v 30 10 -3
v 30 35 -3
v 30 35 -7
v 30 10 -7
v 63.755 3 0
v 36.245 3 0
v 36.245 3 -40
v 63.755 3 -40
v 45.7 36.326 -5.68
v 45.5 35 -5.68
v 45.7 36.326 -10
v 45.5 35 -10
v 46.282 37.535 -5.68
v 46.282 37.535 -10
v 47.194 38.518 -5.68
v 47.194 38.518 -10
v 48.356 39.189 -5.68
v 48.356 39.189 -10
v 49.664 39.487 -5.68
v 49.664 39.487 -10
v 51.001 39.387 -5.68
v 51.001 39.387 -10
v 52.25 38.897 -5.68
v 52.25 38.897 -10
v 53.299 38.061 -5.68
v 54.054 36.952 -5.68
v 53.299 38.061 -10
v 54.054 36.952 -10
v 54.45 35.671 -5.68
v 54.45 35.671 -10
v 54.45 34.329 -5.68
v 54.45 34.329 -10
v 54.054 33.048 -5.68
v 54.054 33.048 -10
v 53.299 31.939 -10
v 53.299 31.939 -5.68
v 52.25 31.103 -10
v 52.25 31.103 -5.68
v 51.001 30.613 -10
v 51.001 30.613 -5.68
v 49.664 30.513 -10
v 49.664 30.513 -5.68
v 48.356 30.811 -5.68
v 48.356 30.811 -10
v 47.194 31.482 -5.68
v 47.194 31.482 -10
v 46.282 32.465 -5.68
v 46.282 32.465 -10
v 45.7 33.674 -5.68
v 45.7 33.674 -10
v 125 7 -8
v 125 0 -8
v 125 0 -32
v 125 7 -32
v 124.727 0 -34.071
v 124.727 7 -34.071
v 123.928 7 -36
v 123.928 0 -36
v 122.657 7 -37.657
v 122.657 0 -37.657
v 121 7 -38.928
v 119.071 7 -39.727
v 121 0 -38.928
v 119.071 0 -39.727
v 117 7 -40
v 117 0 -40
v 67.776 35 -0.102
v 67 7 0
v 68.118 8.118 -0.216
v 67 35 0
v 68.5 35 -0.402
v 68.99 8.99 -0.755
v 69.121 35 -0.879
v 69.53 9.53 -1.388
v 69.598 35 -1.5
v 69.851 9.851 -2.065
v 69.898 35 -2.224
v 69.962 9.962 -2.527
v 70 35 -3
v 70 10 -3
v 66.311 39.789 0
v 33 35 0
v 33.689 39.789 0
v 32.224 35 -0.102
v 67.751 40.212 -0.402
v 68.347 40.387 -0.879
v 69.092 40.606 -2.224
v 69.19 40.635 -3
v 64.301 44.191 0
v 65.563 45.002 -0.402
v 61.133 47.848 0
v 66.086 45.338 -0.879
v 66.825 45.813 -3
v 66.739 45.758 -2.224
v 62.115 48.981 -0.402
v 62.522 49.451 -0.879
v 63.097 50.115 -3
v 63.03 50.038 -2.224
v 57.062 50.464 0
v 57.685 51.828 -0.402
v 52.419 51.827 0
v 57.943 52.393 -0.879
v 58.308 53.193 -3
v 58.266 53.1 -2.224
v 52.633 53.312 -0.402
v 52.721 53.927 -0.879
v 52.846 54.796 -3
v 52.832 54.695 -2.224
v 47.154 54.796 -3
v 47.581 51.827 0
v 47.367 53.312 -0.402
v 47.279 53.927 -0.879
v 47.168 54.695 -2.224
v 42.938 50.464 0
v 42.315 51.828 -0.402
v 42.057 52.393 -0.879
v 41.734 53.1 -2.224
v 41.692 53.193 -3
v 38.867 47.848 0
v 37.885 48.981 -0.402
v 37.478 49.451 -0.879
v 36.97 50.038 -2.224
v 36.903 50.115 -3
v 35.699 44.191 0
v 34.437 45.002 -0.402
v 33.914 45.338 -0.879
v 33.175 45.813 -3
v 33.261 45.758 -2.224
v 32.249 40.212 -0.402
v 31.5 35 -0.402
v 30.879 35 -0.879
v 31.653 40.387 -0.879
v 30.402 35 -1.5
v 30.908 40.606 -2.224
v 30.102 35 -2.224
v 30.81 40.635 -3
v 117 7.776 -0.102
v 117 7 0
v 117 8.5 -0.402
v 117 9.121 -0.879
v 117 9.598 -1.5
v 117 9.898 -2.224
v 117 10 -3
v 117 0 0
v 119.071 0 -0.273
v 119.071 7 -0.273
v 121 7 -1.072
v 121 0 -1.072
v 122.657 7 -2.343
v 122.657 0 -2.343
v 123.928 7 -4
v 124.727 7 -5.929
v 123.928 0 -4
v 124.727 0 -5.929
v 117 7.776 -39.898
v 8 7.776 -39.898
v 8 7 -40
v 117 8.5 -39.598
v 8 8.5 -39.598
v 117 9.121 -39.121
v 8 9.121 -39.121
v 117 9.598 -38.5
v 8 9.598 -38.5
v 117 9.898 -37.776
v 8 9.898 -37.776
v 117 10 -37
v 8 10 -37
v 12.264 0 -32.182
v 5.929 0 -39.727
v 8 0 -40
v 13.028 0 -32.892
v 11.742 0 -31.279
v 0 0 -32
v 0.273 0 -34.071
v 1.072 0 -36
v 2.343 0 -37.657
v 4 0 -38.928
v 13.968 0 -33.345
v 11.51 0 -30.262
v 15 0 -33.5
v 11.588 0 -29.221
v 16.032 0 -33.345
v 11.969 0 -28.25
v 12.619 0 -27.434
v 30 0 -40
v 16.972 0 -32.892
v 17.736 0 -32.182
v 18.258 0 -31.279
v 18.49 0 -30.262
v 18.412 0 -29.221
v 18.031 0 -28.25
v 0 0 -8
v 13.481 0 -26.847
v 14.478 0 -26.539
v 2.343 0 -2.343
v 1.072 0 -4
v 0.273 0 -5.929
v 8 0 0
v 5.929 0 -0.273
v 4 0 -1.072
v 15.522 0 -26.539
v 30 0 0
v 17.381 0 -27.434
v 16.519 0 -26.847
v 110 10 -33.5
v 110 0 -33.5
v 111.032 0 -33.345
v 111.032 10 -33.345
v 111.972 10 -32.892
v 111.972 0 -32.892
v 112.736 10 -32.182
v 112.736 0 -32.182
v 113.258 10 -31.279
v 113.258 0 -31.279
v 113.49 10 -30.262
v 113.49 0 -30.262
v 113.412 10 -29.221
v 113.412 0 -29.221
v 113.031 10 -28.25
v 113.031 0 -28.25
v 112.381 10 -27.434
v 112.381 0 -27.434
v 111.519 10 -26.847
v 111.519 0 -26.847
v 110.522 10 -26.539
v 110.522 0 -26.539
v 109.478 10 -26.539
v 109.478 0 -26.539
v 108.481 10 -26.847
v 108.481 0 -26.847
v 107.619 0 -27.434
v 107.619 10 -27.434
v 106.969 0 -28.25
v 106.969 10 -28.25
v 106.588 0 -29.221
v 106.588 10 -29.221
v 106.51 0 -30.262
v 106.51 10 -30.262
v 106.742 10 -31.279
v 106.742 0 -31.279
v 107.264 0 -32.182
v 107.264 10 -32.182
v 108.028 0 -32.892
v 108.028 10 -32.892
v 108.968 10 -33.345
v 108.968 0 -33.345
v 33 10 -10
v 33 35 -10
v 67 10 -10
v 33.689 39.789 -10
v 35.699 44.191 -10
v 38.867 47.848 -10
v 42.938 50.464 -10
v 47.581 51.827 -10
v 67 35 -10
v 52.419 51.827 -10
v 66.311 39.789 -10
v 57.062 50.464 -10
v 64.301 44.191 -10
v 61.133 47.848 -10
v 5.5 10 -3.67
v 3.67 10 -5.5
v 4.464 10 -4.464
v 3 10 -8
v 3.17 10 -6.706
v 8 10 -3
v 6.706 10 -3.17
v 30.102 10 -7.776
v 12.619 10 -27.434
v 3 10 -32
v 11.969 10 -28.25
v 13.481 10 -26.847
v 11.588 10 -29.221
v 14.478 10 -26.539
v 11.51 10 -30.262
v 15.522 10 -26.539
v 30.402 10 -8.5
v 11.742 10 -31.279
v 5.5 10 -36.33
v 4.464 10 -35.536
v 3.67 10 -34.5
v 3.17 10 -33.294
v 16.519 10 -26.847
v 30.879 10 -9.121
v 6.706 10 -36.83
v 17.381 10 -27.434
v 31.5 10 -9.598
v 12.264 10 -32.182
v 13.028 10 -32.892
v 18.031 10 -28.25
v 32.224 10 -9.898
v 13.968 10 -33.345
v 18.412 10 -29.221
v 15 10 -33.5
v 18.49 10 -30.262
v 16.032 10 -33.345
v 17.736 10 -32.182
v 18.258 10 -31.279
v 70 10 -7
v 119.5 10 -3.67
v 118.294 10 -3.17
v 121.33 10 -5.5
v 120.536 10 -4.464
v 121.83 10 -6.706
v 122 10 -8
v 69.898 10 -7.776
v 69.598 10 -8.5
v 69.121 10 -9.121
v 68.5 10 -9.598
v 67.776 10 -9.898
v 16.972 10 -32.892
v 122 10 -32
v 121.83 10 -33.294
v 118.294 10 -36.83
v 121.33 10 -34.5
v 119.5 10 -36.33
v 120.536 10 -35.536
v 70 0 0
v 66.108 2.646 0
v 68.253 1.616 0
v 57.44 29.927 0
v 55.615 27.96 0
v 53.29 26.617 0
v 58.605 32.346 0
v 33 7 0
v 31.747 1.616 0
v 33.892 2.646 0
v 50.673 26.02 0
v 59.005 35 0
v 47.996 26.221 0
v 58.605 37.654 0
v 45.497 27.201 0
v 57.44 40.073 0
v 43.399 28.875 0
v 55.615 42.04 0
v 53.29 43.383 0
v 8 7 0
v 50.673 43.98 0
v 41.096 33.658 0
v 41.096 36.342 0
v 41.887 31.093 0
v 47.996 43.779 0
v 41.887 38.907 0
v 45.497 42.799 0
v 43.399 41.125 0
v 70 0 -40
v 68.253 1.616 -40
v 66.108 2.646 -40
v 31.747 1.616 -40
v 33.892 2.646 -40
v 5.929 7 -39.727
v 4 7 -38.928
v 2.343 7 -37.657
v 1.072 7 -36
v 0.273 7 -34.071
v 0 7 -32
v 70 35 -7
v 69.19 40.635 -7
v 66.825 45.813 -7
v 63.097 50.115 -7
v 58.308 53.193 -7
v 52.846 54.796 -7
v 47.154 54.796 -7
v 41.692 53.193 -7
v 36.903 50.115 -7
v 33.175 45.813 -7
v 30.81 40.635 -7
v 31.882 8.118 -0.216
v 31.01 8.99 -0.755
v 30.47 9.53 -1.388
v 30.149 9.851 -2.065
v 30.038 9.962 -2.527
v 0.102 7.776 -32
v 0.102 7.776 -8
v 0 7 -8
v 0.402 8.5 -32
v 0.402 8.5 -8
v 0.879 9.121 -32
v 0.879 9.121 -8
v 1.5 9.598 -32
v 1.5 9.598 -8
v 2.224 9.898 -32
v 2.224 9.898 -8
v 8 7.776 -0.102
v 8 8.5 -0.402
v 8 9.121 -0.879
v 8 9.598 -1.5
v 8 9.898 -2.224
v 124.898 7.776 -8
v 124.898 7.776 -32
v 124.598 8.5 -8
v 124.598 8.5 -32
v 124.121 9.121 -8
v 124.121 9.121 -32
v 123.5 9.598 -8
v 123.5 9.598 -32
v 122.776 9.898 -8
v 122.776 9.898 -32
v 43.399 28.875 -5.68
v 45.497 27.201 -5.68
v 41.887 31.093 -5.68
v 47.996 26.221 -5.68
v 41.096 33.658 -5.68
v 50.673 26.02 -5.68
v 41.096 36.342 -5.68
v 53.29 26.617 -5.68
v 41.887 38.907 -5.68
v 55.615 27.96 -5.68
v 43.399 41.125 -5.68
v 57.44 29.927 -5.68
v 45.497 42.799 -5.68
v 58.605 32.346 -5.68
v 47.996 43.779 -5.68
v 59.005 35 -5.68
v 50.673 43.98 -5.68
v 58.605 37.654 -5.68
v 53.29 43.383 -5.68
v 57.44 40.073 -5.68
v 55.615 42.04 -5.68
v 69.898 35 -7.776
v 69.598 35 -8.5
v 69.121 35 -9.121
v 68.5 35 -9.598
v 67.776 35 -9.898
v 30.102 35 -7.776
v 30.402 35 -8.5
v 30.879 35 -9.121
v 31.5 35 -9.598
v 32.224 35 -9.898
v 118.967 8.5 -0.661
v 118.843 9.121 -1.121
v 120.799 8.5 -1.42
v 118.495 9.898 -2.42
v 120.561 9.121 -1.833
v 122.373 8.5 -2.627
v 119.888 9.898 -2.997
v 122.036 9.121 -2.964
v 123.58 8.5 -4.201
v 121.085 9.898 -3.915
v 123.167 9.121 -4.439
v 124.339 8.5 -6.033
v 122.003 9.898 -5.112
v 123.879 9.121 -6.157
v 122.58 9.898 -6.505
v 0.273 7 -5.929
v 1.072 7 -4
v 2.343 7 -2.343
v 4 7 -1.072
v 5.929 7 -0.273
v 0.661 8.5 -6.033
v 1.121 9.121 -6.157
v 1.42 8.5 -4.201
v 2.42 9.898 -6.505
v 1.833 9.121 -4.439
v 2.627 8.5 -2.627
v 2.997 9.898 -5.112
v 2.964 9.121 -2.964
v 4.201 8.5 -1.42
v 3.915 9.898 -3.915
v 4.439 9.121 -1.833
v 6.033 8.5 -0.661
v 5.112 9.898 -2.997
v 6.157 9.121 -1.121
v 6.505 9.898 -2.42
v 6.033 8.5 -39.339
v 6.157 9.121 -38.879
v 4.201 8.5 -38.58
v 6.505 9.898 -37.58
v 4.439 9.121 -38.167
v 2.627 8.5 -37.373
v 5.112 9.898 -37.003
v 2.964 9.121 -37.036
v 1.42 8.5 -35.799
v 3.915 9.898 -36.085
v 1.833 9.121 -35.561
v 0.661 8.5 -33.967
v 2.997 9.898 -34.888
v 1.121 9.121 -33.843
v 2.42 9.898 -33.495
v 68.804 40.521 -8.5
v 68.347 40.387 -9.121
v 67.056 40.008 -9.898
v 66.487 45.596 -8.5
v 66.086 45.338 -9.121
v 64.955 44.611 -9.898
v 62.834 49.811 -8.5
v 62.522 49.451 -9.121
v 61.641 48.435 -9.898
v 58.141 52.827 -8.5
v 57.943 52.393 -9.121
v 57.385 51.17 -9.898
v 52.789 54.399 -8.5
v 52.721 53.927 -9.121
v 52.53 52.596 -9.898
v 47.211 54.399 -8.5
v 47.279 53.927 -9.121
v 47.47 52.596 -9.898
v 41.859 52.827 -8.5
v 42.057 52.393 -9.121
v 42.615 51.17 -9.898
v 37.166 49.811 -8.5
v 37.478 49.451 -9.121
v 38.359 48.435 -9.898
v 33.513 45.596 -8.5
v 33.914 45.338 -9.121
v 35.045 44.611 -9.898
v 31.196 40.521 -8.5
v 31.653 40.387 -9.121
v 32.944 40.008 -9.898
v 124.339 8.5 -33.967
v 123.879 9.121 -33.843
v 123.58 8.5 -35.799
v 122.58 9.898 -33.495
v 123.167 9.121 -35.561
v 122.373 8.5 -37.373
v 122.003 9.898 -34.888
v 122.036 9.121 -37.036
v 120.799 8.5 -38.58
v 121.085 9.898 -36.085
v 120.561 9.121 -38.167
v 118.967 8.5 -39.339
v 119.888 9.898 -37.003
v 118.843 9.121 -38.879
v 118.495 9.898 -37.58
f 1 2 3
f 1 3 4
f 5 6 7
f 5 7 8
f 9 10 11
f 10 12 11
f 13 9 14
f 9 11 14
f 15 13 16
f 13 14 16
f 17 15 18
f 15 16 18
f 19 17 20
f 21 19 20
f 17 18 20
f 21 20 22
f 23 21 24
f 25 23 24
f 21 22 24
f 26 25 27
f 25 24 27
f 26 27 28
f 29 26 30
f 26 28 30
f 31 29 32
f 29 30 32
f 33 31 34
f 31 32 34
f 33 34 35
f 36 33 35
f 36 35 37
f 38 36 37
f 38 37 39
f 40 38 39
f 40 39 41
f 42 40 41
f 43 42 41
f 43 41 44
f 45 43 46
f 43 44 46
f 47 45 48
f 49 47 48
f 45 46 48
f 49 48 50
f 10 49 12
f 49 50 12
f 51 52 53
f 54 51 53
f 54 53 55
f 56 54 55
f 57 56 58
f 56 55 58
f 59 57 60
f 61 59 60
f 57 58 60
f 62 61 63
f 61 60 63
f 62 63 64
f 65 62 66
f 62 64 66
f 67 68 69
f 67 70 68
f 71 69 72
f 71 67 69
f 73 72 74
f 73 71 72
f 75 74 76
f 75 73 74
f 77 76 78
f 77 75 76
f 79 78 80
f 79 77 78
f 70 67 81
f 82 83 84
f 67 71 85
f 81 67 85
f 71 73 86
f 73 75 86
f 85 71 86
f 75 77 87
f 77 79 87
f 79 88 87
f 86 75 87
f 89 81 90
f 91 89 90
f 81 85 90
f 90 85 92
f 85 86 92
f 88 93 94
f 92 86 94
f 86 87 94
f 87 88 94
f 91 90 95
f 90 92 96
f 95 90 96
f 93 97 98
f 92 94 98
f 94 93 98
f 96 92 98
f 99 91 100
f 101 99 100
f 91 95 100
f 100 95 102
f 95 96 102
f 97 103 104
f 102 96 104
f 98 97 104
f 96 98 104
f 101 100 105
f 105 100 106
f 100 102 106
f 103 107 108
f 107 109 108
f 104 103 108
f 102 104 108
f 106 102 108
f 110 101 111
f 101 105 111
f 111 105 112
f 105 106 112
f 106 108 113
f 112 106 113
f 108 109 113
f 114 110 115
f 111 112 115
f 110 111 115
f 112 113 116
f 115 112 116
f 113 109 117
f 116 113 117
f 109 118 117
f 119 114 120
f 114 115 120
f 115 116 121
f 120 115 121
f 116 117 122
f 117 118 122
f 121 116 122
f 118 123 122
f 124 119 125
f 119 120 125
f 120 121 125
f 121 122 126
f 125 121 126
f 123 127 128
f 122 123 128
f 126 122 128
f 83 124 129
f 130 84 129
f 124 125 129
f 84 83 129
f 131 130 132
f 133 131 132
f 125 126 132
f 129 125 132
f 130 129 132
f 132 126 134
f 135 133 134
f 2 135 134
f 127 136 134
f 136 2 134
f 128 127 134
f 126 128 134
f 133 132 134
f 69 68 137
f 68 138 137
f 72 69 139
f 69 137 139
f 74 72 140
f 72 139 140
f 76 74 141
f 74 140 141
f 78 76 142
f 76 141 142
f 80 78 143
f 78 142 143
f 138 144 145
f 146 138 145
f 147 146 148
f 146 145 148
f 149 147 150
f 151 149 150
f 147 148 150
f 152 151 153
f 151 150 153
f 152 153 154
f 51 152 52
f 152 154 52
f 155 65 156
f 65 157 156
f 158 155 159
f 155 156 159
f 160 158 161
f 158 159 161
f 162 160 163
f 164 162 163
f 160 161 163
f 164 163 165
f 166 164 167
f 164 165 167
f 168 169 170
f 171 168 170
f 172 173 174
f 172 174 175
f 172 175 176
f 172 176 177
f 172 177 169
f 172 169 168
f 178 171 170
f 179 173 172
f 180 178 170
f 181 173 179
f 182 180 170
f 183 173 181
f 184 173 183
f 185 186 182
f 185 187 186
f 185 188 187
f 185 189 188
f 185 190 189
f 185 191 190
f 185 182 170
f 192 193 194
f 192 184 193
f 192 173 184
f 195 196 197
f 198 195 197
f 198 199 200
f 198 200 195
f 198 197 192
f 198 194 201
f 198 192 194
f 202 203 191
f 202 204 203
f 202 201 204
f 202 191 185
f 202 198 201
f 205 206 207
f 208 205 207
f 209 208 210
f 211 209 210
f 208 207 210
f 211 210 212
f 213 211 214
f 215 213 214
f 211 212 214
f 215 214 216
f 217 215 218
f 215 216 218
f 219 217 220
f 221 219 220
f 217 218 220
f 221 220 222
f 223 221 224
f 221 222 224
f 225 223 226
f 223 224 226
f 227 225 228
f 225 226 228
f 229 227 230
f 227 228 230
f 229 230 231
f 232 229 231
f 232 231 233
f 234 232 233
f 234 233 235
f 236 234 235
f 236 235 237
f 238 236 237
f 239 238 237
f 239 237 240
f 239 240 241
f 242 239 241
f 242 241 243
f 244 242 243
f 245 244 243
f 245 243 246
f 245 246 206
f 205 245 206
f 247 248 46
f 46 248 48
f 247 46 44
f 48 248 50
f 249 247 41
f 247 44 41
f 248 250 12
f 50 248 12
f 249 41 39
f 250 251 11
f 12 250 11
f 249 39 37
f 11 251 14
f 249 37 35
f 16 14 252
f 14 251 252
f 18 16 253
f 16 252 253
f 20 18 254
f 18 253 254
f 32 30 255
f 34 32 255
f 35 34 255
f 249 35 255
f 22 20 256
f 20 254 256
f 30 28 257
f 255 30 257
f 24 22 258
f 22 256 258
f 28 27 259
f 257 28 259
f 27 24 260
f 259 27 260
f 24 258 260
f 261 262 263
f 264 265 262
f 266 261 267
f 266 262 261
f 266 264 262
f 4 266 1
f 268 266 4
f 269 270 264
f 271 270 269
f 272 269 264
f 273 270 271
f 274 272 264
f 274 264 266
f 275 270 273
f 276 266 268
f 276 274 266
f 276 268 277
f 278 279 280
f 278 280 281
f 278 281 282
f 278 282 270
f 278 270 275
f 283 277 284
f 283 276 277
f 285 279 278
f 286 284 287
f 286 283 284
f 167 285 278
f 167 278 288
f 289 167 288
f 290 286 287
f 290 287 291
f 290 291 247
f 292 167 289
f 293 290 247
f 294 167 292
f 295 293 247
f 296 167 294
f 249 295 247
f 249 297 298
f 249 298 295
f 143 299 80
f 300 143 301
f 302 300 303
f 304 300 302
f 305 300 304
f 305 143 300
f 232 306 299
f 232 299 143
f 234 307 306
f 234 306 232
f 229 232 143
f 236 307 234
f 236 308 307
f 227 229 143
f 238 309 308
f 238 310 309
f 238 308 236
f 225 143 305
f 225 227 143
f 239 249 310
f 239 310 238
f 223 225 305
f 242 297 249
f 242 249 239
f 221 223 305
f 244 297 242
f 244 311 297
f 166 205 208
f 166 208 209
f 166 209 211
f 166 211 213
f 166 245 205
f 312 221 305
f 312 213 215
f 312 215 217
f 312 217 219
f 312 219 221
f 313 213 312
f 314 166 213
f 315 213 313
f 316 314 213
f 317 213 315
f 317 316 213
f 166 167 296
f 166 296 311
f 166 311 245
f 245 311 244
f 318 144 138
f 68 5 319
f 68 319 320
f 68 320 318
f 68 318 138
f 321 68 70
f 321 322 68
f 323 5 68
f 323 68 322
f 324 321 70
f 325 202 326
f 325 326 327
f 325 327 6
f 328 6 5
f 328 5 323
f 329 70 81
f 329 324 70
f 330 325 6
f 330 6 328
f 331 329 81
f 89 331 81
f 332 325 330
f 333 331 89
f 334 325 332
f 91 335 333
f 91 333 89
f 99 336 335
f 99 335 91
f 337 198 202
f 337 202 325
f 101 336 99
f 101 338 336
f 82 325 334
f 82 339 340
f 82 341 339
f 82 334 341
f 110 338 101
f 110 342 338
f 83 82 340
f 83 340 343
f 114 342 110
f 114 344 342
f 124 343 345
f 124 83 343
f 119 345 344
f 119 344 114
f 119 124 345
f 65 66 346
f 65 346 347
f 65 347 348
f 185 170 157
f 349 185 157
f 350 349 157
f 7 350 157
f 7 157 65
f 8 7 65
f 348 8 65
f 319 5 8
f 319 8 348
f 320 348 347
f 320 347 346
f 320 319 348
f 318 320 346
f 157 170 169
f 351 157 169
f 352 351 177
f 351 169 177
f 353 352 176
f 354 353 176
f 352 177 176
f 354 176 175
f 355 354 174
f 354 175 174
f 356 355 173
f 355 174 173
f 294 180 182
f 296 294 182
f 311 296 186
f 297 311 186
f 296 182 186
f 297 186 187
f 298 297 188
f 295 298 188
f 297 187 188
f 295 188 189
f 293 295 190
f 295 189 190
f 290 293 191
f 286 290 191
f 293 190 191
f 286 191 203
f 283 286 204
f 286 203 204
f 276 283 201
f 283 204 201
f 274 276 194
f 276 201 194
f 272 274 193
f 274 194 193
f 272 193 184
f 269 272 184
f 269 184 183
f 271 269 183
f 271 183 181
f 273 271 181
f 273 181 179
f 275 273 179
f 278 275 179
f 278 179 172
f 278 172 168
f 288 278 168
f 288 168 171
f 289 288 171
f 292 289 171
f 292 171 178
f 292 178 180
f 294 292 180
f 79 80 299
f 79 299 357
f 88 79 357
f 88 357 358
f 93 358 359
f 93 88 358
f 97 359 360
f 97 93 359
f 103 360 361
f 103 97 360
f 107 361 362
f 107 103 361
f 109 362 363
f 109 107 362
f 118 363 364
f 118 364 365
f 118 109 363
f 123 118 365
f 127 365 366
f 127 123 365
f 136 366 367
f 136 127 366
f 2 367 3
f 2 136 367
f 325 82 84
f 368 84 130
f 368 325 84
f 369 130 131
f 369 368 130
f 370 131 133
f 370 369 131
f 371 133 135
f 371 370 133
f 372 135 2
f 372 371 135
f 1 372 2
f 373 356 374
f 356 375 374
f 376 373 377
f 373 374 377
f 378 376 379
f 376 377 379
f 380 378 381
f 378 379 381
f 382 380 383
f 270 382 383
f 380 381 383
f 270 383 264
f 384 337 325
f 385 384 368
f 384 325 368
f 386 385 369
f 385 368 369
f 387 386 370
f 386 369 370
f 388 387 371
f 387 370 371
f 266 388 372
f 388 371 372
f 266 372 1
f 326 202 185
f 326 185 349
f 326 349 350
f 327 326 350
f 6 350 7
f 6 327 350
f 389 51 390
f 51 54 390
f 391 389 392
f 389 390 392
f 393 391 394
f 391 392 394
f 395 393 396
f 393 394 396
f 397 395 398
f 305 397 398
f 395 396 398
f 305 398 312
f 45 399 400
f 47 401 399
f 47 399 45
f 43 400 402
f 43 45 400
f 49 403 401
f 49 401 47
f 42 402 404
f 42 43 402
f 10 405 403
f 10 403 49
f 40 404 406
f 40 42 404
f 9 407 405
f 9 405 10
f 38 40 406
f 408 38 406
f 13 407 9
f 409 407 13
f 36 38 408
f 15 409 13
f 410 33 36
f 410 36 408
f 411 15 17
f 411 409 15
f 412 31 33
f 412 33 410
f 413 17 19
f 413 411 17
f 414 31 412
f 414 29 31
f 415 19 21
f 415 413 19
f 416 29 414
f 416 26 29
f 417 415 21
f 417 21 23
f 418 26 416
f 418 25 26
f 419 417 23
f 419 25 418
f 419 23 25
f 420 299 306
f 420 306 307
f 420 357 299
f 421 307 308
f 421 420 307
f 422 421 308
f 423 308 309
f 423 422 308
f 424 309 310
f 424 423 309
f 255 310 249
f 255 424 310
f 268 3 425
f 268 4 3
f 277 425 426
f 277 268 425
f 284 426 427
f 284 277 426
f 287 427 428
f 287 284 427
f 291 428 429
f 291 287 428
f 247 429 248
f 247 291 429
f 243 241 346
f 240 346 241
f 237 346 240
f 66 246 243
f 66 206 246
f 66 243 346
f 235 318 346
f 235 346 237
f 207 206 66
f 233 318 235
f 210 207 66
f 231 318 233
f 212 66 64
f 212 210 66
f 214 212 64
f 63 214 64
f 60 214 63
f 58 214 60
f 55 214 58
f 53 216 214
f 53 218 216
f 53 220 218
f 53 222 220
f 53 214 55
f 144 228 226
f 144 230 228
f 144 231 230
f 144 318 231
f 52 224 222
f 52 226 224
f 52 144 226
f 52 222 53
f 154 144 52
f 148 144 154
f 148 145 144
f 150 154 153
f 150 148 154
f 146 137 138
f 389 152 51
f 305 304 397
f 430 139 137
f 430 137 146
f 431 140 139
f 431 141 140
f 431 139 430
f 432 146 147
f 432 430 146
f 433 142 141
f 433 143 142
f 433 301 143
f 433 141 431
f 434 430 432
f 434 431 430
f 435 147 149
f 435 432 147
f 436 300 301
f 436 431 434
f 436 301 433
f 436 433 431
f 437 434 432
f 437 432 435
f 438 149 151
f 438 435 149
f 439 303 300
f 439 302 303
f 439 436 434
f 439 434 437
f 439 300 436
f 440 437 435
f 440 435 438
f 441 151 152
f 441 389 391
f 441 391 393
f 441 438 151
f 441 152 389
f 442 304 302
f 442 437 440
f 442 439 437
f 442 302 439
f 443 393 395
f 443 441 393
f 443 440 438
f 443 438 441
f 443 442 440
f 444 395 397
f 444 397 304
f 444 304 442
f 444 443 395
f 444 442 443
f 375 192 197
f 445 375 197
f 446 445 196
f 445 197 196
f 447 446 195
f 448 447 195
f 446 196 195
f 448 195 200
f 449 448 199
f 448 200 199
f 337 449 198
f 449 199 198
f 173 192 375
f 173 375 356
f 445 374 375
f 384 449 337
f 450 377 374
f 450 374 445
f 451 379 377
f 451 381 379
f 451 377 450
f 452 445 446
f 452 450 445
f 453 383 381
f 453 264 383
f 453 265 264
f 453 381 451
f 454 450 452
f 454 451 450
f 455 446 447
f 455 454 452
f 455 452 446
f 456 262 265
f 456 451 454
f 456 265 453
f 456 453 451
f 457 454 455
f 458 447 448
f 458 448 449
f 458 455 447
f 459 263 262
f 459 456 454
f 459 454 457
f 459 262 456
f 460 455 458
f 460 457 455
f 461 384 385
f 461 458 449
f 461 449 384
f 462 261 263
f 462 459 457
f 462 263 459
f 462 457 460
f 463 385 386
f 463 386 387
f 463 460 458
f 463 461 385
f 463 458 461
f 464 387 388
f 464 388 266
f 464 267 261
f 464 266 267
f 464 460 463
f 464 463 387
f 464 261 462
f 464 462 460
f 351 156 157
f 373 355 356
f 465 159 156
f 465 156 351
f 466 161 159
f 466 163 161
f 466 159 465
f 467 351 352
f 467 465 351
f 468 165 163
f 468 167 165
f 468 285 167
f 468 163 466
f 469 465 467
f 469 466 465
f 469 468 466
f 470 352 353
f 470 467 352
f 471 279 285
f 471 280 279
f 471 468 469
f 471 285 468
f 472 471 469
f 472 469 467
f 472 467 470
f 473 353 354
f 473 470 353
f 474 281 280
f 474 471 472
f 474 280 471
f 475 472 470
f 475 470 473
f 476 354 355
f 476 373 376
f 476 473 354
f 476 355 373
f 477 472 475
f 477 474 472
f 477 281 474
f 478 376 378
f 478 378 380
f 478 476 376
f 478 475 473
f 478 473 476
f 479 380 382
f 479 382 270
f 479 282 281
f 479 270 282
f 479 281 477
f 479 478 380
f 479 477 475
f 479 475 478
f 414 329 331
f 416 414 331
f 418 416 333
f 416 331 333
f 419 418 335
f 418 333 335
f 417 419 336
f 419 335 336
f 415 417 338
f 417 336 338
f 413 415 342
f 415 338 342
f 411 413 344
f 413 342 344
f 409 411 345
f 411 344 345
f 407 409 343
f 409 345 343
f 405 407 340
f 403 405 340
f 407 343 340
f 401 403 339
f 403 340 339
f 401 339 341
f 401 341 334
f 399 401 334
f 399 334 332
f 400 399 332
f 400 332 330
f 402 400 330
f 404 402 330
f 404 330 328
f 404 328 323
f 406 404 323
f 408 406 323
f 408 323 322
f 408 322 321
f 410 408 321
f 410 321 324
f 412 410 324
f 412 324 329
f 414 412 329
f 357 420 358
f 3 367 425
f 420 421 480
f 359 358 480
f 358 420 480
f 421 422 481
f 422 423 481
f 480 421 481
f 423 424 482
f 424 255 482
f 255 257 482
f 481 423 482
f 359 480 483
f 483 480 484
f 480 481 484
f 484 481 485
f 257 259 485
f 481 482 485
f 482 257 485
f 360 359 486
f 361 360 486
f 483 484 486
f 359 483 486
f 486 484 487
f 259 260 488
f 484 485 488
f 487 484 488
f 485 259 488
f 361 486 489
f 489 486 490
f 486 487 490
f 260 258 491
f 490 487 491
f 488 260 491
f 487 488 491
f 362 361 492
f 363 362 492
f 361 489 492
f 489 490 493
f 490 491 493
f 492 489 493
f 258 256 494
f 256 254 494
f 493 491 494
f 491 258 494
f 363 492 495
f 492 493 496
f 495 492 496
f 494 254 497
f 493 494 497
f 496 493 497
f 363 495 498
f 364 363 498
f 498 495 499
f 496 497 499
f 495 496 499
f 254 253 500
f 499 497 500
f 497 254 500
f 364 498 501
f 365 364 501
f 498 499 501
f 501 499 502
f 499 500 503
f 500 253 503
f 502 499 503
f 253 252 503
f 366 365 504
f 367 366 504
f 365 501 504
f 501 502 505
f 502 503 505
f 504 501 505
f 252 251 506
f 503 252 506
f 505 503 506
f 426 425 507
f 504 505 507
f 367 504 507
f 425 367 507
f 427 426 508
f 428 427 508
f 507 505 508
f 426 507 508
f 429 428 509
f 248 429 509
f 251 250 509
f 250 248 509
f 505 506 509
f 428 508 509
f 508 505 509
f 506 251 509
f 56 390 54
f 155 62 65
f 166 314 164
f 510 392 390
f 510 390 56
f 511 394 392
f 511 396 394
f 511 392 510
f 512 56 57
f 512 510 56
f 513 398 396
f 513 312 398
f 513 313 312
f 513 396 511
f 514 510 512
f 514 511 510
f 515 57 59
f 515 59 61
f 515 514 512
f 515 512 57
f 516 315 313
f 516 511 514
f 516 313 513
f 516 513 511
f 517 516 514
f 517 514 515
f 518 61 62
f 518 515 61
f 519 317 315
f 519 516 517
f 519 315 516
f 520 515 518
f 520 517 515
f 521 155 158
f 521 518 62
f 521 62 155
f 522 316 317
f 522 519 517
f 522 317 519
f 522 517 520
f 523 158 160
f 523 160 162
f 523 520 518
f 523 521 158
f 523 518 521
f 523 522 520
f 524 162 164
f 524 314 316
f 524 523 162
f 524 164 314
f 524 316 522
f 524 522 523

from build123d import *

# Parameters (mm, degrees)
SKETCH2_W                               = 125
SKETCH2_H                               = 40
BOSS_EXTRUDE1_DEPTH                     = 10
BOSS_EXTRUDE2_DEPTH                     = 10
SKETCH4_W                               = 40
SKETCH4_H                               = 3
CUT_EXTRUDE1_DEPTH                      = 80
CBORE_FOR_M8_HEX_HEAD_BOLT1_D           = 9
CBORE_FOR_M8_HEX_HEAD_BOLT1_CBORE_D     = 18.01
CBORE_FOR_M8_HEX_HEAD_BOLT1_CBORE_DEPTH = 5.68
FILLET2_R                               = 8
FILLET3_R                               = 3
F_7_0_7_DIAMETER_HOLE1_D                = 7


with BuildPart() as part:
    # Sketch2 → Boss-Extrude1 (new body)
    with BuildSketch(Plane(origin=(0, 0, 0), x_dir=(1, 0, 0), z_dir=(0, 1, 0))):
        with Locations((62.5, 20)):
            Rectangle(SKETCH2_W, SKETCH2_H)
    extrude(amount=BOSS_EXTRUDE1_DEPTH)

    # Sketch3 → Boss-Extrude2 (add)
    with BuildSketch(Plane.XY):
        with BuildLine():
            Line((30, 35), (30, 0))
            Line((30, 0), (70, 0))
            Line((70, 0), (70, 35))
            ThreePointArc((70, 35), (50, 55), (30, 35))
        make_face()
    extrude(amount=-BOSS_EXTRUDE2_DEPTH)

    # Sketch4 → Cut-Extrude1 (cut)
    with BuildSketch(Plane.XY):
        with Locations((50, 1.5)):
            Rectangle(SKETCH4_W, SKETCH4_H)
    extrude(amount=-CUT_EXTRUDE1_DEPTH, mode=Mode.SUBTRACT)

    # CBORE for M8 Hex Head Bolt1 (through all)
    with Locations(Plane(origin=(50, 35, 0), x_dir=(1, 0, 0), z_dir=(0, 0, 1))):
        with Locations((0, 0)):
            CounterBoreHole(CBORE_FOR_M8_HEX_HEAD_BOLT1_D / 2, CBORE_FOR_M8_HEX_HEAD_BOLT1_CBORE_D / 2, CBORE_FOR_M8_HEX_HEAD_BOLT1_CBORE_DEPTH)

    # Fillet2
    # the kernel refuses this fillet: 8 mm, written as the material it adds along each edge
    with BuildSketch(Plane(origin=(70, 3, 0), x_dir=(-1, 0, 0), z_dir=(0, 0, -1))) as fillet2_piece_1:
        with BuildLine():
            CenterArc((6.244997998, -8), FILLET2_R, 90, 51.317812547)
            Line((0, -3), (0, 0))
            Line((0, 0), (6.244997998, 0))
        make_face()
    extrude(amount=40)
    with BuildSketch(Plane(origin=(30, 3, 0), x_dir=(0, -1, 0), z_dir=(0, 0, -1))) as fillet2_piece_2:
        with BuildLine():
            CenterArc((8, -6.244997998), FILLET2_R, 128.682187453, 51.317812547)
            Line((0, -6.244997998), (0, 0))
            Line((0, 0), (3, 0))
        make_face()
    extrude(amount=40)
    # the kernel refuses this fillet: 8 mm, written as the material it takes off along each edge
    with BuildSketch(Plane(origin=(125, -20, 0), x_dir=(-1, 0, 0), z_dir=(0, 1, 0)), Plane(origin=(125, -20, -40), x_dir=(0, 0, 1), z_dir=(0, 1, 0))) as fillet2_2_piece_1:
        with BuildLine():
            CenterArc((FILLET2_R, -FILLET2_R), FILLET2_R, 90, 90)
            Line((0, -FILLET2_R), (0, 0))
            Line((0, 0), (FILLET2_R, 0))
        make_face()
    extrude(amount=50, mode=Mode.SUBTRACT)
    with BuildSketch(Plane(origin=(0, -20, -40), x_dir=(0, 0, 1), z_dir=(0, 1, 0)), Plane(origin=(0, -20, 0), x_dir=(1, 0, 0), z_dir=(0, 1, 0))) as fillet2_2_piece_2:
        with BuildLine():
            CenterArc((FILLET2_R, FILLET2_R), FILLET2_R, 180, 90)
            Line((0, FILLET2_R), (0, 0))
            Line((0, 0), (FILLET2_R, 0))
        make_face()
    extrude(amount=50, mode=Mode.SUBTRACT)

    # Fillet3
    fillet3_edges = [part.edges().sort_by_distance(p)[0] for p in [
        (93.5, 10, 0),
        (70, 22.5, -10),
        (30, 22.5, -10),
        (70, 22.5, 0),
        (50, 55, 0),
        (30, 22.5, 0),
        (50, 55, -10),
        (125, 10, -20),
        (19, 10, 0),
        (62.5, 10, -40),
        (0, 10, -20),
        (2.343145751, 10, -2.343145751),
        (2.343145751, 10, -37.656854249),
        (122.656854249, 10, -37.656854249),
        (122.656854249, 10, -2.343145751),
    ]]
    fillet(fillet3_edges, radius=FILLET3_R)

    # Ø7.0 (7) Diameter Hole1 (through all)
    with Locations(Plane(origin=(15, 10, -30), x_dir=(0, 0, 1), z_dir=(0, 1, 0))):
        with Locations((0, 0), (0, 95)):
            Hole(F_7_0_7_DIAMETER_HOLE1_D / 2)


solid = part.part
